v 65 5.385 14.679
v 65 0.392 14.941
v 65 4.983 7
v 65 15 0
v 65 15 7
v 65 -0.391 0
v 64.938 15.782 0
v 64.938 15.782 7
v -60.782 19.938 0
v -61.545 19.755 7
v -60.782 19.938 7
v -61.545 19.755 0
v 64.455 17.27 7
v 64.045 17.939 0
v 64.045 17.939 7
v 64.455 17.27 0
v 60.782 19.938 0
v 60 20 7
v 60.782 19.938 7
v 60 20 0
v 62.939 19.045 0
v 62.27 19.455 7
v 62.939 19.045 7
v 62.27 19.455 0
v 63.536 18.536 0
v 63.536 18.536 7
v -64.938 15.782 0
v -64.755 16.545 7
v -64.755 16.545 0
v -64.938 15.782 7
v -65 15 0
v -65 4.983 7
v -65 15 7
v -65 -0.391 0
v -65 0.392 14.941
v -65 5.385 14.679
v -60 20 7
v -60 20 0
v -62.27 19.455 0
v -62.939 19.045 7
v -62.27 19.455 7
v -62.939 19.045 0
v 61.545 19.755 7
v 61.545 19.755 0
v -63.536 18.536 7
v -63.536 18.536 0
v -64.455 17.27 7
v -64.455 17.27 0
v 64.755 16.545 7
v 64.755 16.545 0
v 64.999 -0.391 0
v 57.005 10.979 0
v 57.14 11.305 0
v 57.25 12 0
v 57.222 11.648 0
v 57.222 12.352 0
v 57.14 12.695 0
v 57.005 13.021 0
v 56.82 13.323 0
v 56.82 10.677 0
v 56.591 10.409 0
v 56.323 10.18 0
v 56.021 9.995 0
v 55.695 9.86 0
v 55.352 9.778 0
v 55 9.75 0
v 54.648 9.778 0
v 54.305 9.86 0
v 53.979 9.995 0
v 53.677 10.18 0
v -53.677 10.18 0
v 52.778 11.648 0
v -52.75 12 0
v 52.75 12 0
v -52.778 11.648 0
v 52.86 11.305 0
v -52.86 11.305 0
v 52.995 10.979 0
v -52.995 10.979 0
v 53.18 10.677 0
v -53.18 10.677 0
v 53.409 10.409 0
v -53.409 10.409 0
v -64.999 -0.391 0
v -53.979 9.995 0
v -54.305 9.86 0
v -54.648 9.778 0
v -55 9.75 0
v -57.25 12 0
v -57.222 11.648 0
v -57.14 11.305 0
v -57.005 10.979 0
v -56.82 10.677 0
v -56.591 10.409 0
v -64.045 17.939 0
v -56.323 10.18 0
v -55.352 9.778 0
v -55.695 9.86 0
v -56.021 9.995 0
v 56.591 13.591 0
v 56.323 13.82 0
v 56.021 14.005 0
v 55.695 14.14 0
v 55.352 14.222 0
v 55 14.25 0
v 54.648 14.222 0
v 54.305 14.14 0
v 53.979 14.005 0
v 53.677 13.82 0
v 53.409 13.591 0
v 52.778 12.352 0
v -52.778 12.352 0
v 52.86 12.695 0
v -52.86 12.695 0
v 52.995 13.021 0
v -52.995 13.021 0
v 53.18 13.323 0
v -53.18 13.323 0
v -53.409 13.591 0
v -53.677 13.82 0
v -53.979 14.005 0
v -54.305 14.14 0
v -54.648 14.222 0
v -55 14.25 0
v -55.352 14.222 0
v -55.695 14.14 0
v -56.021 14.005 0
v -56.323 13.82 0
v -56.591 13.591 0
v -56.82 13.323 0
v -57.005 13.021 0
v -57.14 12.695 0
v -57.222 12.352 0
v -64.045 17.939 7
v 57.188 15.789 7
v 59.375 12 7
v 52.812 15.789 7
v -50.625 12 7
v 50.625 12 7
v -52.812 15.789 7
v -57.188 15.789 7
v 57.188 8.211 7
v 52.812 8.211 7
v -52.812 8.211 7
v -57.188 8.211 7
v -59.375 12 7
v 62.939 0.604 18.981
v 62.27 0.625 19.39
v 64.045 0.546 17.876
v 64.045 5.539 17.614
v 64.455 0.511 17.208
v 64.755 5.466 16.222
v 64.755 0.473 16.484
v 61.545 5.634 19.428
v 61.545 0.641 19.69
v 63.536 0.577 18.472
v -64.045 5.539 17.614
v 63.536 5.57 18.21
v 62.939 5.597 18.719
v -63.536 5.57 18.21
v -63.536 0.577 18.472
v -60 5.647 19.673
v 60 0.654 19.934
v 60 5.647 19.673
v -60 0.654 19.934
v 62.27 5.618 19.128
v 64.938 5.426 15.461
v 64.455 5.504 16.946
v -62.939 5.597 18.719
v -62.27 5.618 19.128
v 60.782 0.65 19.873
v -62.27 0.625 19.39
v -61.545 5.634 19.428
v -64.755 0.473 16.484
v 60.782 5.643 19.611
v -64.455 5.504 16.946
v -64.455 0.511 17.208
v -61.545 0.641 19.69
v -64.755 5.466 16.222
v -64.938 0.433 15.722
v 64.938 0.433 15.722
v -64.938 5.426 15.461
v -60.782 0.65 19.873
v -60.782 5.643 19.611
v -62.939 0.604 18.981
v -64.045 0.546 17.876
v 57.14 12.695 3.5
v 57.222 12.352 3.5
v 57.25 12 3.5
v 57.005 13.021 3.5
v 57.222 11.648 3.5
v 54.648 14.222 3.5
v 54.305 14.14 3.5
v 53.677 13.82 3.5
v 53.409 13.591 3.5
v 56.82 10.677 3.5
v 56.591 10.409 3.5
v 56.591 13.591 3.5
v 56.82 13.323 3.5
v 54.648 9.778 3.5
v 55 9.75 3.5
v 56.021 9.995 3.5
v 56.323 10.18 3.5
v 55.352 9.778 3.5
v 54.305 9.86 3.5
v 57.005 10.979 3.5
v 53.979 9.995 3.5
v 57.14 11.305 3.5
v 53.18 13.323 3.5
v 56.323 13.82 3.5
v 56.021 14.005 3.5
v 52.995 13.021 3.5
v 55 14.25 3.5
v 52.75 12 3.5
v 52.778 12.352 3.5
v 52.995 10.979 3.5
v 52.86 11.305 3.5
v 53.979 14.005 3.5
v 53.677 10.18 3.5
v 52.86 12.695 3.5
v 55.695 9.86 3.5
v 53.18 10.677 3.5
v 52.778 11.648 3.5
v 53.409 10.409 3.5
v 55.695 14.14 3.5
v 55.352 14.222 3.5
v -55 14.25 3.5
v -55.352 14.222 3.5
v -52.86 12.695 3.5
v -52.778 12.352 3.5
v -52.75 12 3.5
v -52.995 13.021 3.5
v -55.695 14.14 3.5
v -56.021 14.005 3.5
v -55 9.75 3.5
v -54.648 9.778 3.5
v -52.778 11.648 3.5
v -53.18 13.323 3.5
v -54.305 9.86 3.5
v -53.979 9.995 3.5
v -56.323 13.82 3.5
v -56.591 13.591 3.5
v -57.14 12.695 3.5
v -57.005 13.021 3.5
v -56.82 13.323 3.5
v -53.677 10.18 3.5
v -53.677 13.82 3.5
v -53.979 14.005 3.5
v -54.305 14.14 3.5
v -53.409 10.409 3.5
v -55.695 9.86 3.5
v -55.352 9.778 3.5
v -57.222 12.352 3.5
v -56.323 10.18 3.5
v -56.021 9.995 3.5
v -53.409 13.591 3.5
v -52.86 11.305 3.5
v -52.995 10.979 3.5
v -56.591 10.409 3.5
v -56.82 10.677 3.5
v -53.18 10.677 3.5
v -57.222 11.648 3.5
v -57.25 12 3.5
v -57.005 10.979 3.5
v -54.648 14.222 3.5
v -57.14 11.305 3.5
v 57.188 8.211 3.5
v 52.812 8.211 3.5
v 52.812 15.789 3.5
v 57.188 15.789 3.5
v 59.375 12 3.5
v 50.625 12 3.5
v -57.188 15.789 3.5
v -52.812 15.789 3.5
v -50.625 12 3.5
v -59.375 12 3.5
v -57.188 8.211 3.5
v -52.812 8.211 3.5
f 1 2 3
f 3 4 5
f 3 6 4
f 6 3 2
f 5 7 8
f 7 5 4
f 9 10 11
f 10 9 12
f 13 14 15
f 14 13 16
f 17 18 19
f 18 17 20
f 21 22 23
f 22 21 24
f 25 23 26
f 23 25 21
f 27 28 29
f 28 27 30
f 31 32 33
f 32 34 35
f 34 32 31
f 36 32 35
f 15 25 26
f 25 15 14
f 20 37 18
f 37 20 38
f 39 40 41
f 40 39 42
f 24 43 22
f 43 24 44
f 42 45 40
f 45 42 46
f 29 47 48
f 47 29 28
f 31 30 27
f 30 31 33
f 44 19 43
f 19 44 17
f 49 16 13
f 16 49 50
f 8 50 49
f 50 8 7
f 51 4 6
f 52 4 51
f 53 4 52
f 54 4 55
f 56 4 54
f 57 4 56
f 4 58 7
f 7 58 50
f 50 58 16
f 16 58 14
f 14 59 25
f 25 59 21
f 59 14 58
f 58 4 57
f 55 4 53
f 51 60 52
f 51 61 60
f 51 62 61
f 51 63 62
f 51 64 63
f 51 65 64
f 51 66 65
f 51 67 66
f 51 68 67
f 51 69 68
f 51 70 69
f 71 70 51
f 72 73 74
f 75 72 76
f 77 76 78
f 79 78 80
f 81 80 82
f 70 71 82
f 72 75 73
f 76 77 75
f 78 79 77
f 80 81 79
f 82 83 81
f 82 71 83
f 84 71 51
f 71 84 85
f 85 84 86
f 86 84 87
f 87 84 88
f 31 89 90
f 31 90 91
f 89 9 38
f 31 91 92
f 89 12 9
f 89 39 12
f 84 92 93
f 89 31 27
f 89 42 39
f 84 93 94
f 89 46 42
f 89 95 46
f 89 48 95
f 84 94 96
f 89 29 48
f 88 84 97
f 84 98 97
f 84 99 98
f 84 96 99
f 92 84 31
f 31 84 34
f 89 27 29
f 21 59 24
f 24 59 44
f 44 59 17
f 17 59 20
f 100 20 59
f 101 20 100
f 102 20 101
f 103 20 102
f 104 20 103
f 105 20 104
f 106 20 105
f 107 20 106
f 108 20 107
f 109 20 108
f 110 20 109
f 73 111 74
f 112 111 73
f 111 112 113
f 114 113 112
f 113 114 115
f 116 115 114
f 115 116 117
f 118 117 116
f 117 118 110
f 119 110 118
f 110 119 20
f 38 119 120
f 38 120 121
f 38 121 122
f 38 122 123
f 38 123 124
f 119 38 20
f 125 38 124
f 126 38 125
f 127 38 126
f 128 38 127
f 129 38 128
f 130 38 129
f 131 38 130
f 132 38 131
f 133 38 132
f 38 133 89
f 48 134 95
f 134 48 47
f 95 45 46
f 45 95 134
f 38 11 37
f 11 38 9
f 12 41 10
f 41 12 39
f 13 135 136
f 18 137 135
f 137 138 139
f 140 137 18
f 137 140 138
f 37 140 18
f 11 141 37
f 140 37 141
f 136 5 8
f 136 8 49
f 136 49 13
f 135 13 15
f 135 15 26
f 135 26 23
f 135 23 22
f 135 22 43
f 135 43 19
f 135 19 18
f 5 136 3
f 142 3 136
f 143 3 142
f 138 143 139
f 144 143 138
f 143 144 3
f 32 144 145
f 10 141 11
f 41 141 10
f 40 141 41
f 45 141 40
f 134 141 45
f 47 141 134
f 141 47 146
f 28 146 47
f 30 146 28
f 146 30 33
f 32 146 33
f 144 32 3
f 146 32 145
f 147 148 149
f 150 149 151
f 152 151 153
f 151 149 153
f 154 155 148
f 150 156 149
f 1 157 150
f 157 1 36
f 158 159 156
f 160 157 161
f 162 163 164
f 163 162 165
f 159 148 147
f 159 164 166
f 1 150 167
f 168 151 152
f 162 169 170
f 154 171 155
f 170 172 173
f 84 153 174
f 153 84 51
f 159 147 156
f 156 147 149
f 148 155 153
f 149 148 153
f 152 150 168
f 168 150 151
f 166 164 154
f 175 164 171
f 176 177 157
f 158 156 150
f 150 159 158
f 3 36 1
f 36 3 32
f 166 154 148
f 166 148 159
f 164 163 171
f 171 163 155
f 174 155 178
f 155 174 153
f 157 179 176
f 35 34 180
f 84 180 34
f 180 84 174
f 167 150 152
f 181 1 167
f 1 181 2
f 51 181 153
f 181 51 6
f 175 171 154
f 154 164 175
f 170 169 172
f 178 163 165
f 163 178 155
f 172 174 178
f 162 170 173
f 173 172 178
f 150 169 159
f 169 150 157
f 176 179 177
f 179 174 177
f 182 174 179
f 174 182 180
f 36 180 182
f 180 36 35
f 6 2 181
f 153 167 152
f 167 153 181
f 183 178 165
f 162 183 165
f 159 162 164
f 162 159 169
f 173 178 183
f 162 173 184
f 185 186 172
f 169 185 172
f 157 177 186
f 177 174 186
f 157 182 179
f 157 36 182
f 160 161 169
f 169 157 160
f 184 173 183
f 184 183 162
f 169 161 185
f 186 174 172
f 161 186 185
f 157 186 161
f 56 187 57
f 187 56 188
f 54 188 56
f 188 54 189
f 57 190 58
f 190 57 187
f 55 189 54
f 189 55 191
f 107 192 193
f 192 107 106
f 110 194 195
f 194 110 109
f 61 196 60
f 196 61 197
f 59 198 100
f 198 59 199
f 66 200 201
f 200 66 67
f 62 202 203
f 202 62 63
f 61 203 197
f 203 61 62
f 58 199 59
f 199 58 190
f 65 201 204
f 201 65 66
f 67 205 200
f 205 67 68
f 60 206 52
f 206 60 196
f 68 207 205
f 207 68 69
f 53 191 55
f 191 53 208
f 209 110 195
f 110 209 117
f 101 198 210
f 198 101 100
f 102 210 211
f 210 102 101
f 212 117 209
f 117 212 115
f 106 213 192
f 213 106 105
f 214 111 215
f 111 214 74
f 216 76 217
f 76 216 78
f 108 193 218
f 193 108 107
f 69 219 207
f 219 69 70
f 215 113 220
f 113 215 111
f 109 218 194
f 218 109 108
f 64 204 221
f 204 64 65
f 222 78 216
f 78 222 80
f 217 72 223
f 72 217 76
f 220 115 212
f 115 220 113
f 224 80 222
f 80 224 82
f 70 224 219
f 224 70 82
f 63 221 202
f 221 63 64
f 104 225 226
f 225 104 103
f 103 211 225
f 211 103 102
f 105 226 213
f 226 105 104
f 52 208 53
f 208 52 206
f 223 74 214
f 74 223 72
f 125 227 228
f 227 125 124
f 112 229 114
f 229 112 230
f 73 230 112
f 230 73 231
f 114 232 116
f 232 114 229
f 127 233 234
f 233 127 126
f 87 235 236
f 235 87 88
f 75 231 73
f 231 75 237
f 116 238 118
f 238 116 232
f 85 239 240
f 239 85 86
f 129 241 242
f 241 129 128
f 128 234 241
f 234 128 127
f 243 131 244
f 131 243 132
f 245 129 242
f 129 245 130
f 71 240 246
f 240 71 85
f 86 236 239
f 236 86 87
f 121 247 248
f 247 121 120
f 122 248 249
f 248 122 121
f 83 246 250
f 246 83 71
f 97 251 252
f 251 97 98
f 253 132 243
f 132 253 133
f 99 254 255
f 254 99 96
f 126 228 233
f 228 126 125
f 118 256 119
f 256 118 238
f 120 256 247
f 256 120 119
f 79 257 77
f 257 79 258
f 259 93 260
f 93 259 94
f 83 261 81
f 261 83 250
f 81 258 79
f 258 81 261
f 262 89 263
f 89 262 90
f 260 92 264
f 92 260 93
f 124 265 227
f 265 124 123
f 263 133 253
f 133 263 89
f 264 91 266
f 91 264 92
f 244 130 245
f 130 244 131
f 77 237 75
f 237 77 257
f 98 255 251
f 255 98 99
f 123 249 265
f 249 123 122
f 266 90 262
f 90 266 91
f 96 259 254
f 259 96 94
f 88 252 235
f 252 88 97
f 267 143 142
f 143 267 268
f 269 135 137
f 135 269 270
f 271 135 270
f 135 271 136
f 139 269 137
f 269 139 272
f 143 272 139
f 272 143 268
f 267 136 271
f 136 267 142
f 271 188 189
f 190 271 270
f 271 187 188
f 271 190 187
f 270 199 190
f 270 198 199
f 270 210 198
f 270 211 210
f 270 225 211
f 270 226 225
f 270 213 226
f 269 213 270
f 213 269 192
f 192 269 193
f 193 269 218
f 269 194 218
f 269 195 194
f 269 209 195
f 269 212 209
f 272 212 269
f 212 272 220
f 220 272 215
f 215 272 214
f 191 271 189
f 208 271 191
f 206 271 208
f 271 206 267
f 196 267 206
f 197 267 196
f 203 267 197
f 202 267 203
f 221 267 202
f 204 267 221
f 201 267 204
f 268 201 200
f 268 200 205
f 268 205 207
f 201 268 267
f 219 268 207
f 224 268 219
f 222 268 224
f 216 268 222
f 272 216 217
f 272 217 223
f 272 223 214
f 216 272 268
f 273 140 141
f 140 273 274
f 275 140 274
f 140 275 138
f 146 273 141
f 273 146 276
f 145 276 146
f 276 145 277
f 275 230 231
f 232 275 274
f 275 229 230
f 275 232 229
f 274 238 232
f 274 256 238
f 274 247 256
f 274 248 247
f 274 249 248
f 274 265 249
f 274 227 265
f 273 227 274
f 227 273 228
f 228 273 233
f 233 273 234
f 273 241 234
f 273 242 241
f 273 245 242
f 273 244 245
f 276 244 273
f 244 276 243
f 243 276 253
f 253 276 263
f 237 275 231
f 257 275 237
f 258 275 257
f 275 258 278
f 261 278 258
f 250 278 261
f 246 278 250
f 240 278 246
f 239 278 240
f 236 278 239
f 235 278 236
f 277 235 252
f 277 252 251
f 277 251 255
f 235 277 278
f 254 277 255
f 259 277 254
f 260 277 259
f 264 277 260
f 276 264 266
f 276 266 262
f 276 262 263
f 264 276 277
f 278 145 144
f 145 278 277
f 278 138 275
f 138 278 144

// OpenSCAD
len = 130;
$fn=40;

difference() {
   form();

   translate([len/2-10,12,-1]) cylinder(d=4.5,h=10);
   translate([-len/2+10,12,-1]) cylinder(d=4.5,h=10);

   translate([len/2-10,12,3.5]) cylinder($fn=6,d=8.75,h=4);
   translate([-len/2+10,12,3.5]) cylinder($fn=6,d=8.75,h=4);

   translate([-140,-140,-5]) cube([280,280,5]);
}


module form() {
   hull() {
      translate([-len/2,0,0]) cube([len, 5,7]);
      translate([len/2-5,15,0]) cylinder(r=5,h=7);
      translate([-len/2+5,15,0]) cylinder(r=5,h=7);
   }
   translate([0,4.6,-0.3]) rotate([87,0,0]) hull() {
      translate([-len/2,0,0]) cube([len, 5,5]);
      translate([len/2-5,15,0]) cylinder(r=5,h=5);
      translate([-len/2+5,15,0]) cylinder(r=5,h=5);
   }
}
